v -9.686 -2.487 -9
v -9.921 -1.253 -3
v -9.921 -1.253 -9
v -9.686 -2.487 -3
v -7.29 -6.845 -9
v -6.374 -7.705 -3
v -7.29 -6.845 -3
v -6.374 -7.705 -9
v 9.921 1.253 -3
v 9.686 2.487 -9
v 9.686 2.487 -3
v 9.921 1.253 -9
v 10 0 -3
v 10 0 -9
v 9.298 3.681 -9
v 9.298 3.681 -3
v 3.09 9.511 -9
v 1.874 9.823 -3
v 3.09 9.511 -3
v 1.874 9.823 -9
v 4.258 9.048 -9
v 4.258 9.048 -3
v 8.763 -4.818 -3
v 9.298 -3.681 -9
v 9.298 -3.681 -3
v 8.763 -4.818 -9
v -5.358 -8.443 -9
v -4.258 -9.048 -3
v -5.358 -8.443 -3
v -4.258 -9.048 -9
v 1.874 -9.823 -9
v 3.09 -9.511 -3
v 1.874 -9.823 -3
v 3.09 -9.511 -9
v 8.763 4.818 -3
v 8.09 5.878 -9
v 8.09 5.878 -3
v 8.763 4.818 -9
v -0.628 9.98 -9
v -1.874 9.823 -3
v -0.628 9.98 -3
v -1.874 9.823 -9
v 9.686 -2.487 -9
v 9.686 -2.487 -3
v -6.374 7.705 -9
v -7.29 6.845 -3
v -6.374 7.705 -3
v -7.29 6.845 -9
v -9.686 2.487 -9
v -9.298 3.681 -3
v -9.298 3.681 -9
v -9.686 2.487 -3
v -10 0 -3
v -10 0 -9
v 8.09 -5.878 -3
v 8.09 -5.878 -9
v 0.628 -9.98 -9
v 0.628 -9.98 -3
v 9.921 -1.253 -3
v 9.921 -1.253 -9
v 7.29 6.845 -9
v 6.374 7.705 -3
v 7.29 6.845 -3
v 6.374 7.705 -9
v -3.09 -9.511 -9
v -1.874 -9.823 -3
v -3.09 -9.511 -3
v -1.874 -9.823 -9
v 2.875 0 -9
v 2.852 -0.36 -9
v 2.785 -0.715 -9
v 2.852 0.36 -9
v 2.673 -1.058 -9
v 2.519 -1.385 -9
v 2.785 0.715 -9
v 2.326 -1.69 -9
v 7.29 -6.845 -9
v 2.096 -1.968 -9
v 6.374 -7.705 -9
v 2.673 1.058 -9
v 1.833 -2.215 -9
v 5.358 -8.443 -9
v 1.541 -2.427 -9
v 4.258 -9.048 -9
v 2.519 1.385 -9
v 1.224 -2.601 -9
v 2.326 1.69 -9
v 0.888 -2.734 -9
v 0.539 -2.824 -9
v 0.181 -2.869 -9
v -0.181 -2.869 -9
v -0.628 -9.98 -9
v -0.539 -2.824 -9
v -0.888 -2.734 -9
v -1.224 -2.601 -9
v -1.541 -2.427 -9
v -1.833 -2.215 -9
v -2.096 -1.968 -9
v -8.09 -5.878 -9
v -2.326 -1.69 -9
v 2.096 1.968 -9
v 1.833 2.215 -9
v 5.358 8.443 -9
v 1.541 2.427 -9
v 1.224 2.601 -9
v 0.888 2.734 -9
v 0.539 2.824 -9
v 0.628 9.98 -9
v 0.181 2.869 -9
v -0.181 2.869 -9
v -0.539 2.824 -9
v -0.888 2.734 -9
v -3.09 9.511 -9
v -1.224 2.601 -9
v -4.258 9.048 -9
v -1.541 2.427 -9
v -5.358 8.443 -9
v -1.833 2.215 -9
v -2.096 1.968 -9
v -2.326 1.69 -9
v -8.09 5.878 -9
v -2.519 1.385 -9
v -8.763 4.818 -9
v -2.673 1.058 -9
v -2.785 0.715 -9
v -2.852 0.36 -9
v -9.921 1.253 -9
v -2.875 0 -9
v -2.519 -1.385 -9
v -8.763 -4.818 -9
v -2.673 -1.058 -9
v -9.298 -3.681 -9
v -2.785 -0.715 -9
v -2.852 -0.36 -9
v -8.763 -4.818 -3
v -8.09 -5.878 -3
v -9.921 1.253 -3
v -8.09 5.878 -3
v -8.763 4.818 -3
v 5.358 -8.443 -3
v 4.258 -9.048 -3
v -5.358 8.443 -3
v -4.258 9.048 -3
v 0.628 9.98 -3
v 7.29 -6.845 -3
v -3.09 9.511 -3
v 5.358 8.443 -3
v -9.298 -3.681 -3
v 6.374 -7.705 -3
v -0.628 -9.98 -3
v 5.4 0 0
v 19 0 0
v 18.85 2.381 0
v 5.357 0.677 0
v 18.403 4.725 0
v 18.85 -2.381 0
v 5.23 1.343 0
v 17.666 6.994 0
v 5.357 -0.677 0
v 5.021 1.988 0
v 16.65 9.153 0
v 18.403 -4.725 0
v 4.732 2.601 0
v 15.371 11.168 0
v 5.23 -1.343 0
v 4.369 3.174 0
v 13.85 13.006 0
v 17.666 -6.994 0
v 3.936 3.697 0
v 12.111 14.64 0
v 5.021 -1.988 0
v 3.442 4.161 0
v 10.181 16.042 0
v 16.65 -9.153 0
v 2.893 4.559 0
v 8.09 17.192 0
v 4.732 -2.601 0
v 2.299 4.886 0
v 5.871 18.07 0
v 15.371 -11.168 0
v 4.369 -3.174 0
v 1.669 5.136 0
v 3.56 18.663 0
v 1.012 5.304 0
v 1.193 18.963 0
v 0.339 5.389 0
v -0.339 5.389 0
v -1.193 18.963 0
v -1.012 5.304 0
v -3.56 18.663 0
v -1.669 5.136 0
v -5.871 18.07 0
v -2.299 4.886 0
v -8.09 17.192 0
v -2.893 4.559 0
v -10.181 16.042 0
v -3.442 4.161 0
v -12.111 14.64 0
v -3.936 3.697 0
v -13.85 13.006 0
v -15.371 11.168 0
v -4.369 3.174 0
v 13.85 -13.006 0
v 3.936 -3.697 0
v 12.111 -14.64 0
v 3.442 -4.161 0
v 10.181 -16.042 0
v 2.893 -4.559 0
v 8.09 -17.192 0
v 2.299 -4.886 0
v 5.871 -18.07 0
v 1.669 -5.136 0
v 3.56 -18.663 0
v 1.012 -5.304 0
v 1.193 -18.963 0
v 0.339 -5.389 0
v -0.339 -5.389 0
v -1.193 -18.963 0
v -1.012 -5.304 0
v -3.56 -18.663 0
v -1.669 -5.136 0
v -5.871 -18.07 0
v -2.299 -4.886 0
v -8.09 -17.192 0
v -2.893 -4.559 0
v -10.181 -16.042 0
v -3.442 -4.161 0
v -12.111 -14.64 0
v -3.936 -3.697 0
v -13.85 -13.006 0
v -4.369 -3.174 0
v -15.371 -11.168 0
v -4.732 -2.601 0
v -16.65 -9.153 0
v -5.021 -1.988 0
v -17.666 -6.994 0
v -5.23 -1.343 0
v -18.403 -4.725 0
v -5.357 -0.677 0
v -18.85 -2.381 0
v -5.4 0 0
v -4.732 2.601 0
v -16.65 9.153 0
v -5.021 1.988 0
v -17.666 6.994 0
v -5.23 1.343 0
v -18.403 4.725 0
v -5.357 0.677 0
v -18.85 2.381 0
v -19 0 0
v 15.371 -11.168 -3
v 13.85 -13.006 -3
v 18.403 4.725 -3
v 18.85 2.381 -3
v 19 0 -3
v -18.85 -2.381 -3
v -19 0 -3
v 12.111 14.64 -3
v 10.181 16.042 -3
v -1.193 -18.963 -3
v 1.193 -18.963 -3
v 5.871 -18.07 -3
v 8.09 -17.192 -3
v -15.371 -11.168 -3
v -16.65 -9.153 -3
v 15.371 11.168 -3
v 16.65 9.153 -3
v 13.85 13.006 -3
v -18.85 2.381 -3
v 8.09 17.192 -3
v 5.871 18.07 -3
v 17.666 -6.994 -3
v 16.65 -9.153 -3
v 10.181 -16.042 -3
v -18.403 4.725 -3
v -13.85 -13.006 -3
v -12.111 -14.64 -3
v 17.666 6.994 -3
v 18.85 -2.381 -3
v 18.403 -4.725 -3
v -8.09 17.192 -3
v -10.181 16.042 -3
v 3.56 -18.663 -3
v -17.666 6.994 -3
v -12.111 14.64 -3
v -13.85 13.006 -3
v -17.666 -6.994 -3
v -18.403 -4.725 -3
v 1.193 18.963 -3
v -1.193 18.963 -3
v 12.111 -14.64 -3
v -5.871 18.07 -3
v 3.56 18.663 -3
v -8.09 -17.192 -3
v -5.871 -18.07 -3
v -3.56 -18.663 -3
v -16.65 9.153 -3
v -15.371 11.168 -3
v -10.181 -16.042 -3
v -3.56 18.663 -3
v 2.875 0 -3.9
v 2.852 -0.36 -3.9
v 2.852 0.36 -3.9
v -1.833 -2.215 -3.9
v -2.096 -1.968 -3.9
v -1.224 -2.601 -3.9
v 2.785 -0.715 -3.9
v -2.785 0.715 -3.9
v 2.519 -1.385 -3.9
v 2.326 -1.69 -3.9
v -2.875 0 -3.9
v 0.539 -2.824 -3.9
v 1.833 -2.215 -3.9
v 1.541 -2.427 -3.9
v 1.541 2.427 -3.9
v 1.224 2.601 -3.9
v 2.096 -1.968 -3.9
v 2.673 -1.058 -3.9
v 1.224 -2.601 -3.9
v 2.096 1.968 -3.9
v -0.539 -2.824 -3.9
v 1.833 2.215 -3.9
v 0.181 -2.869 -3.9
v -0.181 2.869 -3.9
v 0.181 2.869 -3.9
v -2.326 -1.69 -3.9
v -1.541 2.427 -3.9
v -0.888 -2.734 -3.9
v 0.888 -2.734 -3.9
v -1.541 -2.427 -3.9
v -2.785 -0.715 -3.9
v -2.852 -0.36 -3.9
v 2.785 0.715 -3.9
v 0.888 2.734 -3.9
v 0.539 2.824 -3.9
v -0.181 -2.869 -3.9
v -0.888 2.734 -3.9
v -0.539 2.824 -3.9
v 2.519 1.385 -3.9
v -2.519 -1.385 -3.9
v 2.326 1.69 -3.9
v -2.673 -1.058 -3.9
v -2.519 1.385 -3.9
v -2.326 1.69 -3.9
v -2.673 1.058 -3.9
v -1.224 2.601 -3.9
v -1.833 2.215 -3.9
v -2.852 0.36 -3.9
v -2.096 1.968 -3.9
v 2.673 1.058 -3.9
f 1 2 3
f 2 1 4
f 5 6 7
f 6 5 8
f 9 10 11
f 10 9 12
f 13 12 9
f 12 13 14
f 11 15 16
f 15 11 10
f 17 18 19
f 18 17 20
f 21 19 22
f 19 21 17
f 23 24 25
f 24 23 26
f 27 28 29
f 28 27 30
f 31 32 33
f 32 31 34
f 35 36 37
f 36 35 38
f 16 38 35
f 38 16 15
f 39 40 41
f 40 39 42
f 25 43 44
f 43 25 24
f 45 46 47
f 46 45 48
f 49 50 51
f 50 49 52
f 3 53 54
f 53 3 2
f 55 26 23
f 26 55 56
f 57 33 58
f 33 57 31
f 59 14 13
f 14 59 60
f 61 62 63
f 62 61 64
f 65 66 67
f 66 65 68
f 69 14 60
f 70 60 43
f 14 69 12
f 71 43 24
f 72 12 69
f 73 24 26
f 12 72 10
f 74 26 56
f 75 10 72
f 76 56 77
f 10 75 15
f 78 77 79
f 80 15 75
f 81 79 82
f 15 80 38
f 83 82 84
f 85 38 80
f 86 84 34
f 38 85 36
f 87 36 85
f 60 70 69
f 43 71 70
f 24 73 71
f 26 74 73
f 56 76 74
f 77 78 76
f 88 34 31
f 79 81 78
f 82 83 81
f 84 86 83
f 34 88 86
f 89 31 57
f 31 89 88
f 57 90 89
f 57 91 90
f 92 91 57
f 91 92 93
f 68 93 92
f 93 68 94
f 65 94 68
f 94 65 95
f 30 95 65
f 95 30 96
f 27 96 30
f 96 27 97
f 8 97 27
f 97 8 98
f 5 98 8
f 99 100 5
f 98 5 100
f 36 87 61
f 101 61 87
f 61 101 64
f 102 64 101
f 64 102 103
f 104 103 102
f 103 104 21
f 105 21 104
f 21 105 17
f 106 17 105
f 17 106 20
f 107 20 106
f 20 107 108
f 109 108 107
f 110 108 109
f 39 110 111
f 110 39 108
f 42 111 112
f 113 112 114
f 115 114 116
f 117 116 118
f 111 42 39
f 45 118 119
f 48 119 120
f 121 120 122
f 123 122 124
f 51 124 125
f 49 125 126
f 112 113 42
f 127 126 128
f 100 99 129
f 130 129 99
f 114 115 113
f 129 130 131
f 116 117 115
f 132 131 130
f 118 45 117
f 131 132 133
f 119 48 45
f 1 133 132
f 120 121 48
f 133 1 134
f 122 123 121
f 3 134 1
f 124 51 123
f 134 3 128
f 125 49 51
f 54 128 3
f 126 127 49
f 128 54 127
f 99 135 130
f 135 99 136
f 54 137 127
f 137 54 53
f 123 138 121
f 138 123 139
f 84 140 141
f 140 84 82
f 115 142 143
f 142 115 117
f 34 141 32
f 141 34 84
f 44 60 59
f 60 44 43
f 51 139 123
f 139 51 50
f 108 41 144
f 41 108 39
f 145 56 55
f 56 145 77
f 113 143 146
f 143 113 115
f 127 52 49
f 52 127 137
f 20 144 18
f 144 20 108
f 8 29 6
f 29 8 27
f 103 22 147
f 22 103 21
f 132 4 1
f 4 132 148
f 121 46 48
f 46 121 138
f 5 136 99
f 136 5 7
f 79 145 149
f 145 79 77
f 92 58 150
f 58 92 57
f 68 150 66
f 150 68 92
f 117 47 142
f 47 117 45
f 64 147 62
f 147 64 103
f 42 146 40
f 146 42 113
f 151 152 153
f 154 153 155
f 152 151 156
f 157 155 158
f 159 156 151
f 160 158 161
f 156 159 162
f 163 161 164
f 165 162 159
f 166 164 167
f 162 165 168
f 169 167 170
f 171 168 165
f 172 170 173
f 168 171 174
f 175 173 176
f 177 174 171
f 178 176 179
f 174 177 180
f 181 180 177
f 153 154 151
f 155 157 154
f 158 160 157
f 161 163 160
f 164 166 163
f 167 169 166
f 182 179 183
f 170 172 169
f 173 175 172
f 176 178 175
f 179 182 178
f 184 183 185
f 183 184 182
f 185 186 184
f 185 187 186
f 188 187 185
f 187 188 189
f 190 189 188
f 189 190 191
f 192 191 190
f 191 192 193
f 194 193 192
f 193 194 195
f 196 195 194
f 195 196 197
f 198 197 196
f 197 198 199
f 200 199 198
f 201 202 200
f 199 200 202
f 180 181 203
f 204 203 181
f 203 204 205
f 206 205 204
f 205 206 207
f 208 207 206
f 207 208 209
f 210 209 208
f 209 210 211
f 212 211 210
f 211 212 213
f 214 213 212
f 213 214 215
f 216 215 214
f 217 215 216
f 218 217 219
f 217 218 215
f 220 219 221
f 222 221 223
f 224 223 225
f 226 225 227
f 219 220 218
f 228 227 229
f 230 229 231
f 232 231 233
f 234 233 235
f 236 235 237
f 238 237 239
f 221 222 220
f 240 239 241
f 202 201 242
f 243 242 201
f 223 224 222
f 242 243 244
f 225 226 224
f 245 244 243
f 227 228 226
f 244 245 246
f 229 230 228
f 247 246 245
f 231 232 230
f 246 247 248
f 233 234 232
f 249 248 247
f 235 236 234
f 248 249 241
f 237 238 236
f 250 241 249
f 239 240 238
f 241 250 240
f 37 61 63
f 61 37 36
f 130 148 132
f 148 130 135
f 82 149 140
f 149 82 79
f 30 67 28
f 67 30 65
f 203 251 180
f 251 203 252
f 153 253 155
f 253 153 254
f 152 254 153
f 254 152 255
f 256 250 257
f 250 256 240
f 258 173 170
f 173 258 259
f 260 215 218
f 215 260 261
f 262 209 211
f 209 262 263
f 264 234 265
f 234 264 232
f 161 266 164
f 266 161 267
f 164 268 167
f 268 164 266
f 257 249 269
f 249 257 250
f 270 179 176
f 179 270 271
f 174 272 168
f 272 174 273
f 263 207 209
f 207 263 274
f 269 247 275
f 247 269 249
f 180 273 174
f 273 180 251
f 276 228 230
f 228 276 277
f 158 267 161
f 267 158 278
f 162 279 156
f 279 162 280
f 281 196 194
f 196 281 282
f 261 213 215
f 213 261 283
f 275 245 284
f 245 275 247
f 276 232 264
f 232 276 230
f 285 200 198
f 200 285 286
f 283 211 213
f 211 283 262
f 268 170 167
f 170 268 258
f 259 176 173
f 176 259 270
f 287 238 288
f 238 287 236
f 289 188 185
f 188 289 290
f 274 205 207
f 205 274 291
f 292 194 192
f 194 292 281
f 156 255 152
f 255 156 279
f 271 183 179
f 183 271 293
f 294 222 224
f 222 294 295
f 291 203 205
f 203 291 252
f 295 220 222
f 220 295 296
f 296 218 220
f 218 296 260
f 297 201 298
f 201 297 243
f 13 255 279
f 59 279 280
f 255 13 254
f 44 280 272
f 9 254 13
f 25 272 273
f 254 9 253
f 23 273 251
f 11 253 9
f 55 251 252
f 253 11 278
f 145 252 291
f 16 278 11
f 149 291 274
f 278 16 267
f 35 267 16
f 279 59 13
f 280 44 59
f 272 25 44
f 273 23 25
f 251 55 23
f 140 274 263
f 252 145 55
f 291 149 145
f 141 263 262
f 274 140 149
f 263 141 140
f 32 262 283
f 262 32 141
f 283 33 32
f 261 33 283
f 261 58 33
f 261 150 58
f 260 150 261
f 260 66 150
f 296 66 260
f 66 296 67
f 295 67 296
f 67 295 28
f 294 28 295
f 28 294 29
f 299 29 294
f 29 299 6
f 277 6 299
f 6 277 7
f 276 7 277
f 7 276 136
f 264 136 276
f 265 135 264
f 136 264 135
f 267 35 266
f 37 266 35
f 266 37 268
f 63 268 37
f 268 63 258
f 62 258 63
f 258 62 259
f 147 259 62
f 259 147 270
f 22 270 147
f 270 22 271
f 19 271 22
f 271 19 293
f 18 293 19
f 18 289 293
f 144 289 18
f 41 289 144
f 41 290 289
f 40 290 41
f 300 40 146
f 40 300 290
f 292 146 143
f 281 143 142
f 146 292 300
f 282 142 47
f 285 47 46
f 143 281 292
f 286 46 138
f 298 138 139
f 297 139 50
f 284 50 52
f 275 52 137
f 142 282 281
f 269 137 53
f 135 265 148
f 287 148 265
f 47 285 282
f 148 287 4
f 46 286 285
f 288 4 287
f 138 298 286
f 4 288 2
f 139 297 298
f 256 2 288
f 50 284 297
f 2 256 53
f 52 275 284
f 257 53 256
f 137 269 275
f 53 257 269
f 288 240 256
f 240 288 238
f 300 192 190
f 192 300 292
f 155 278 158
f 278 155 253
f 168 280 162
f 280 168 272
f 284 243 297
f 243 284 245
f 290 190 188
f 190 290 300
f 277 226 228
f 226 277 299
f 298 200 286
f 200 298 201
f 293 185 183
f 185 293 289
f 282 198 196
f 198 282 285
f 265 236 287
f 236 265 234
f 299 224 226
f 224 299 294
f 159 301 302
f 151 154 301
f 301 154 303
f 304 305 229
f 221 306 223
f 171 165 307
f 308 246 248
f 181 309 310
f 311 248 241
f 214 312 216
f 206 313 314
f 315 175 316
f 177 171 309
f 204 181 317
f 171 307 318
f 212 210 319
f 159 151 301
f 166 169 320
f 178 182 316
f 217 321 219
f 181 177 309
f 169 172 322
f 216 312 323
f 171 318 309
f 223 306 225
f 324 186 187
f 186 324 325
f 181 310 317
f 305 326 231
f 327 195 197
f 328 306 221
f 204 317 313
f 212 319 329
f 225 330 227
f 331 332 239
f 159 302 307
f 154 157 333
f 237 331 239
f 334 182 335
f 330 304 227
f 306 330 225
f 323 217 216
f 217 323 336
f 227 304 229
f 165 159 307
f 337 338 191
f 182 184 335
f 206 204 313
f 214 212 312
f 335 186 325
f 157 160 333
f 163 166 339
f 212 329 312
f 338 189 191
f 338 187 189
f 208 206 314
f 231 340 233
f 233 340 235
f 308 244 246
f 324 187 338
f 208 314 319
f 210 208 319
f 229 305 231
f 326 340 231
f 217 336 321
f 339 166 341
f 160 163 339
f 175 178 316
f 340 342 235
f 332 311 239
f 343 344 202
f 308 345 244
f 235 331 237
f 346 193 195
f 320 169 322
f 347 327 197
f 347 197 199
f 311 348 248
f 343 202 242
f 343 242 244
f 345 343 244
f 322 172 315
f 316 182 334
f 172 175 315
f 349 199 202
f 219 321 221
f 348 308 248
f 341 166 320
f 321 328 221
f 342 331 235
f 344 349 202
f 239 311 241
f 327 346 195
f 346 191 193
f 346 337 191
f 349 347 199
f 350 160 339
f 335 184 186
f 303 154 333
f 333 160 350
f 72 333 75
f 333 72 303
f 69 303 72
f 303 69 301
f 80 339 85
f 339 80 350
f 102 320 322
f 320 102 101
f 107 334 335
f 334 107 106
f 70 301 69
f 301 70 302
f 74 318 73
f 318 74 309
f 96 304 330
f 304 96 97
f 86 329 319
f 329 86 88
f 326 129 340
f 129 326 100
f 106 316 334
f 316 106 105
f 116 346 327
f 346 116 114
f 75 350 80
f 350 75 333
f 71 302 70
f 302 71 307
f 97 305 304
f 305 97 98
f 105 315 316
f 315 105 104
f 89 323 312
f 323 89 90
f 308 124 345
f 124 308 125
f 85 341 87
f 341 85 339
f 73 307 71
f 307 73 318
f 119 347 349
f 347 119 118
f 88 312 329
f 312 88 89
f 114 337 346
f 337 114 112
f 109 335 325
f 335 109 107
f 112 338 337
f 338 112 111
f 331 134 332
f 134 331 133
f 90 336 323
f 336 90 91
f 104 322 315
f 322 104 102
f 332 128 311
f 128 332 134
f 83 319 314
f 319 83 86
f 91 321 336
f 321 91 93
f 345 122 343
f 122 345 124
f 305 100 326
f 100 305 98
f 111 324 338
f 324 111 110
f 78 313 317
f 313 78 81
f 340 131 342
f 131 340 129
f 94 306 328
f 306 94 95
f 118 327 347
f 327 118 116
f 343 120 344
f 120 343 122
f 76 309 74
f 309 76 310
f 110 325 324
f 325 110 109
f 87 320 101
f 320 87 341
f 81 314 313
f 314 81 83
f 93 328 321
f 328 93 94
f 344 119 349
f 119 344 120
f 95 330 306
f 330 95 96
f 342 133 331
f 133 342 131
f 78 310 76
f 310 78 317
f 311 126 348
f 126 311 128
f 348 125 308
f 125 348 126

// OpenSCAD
$fn = 50;


difference() {
	union() {
		translate(v = [0, 0, -9.0000000000]) {
			cylinder(h = 9, r = 10.0000000000);
		}
		translate(v = [0, 0, -3.0000000000]) {
			cylinder(h = 3, r = 19.0000000000);
		}
	}
	union() {
		translate(v = [0, 0, 0]) {
			rotate(a = [0, 0, 0]) {
				difference() {
					union() {
						#translate(v = [0, 0, -9.0000000000]) {
							cylinder(h = 9, r = 2.6000000000);
						}
						#translate(v = [0, 0, -3.9000000000]) {
							cylinder(h = 3.9000000000, r = 10.0000000000, r1 = 2.8750000000, r2 = 5.4000000000);
						}
						#translate(v = [0, 0, -9.0000000000]) {
							cylinder(h = 9, r = 2.8750000000);
						}
						#translate(v = [0, 0, -9.0000000000]) {
							cylinder(h = 9, r = 2.6000000000);
						}
					}
					union();
				}
			}
		}
	}
}
